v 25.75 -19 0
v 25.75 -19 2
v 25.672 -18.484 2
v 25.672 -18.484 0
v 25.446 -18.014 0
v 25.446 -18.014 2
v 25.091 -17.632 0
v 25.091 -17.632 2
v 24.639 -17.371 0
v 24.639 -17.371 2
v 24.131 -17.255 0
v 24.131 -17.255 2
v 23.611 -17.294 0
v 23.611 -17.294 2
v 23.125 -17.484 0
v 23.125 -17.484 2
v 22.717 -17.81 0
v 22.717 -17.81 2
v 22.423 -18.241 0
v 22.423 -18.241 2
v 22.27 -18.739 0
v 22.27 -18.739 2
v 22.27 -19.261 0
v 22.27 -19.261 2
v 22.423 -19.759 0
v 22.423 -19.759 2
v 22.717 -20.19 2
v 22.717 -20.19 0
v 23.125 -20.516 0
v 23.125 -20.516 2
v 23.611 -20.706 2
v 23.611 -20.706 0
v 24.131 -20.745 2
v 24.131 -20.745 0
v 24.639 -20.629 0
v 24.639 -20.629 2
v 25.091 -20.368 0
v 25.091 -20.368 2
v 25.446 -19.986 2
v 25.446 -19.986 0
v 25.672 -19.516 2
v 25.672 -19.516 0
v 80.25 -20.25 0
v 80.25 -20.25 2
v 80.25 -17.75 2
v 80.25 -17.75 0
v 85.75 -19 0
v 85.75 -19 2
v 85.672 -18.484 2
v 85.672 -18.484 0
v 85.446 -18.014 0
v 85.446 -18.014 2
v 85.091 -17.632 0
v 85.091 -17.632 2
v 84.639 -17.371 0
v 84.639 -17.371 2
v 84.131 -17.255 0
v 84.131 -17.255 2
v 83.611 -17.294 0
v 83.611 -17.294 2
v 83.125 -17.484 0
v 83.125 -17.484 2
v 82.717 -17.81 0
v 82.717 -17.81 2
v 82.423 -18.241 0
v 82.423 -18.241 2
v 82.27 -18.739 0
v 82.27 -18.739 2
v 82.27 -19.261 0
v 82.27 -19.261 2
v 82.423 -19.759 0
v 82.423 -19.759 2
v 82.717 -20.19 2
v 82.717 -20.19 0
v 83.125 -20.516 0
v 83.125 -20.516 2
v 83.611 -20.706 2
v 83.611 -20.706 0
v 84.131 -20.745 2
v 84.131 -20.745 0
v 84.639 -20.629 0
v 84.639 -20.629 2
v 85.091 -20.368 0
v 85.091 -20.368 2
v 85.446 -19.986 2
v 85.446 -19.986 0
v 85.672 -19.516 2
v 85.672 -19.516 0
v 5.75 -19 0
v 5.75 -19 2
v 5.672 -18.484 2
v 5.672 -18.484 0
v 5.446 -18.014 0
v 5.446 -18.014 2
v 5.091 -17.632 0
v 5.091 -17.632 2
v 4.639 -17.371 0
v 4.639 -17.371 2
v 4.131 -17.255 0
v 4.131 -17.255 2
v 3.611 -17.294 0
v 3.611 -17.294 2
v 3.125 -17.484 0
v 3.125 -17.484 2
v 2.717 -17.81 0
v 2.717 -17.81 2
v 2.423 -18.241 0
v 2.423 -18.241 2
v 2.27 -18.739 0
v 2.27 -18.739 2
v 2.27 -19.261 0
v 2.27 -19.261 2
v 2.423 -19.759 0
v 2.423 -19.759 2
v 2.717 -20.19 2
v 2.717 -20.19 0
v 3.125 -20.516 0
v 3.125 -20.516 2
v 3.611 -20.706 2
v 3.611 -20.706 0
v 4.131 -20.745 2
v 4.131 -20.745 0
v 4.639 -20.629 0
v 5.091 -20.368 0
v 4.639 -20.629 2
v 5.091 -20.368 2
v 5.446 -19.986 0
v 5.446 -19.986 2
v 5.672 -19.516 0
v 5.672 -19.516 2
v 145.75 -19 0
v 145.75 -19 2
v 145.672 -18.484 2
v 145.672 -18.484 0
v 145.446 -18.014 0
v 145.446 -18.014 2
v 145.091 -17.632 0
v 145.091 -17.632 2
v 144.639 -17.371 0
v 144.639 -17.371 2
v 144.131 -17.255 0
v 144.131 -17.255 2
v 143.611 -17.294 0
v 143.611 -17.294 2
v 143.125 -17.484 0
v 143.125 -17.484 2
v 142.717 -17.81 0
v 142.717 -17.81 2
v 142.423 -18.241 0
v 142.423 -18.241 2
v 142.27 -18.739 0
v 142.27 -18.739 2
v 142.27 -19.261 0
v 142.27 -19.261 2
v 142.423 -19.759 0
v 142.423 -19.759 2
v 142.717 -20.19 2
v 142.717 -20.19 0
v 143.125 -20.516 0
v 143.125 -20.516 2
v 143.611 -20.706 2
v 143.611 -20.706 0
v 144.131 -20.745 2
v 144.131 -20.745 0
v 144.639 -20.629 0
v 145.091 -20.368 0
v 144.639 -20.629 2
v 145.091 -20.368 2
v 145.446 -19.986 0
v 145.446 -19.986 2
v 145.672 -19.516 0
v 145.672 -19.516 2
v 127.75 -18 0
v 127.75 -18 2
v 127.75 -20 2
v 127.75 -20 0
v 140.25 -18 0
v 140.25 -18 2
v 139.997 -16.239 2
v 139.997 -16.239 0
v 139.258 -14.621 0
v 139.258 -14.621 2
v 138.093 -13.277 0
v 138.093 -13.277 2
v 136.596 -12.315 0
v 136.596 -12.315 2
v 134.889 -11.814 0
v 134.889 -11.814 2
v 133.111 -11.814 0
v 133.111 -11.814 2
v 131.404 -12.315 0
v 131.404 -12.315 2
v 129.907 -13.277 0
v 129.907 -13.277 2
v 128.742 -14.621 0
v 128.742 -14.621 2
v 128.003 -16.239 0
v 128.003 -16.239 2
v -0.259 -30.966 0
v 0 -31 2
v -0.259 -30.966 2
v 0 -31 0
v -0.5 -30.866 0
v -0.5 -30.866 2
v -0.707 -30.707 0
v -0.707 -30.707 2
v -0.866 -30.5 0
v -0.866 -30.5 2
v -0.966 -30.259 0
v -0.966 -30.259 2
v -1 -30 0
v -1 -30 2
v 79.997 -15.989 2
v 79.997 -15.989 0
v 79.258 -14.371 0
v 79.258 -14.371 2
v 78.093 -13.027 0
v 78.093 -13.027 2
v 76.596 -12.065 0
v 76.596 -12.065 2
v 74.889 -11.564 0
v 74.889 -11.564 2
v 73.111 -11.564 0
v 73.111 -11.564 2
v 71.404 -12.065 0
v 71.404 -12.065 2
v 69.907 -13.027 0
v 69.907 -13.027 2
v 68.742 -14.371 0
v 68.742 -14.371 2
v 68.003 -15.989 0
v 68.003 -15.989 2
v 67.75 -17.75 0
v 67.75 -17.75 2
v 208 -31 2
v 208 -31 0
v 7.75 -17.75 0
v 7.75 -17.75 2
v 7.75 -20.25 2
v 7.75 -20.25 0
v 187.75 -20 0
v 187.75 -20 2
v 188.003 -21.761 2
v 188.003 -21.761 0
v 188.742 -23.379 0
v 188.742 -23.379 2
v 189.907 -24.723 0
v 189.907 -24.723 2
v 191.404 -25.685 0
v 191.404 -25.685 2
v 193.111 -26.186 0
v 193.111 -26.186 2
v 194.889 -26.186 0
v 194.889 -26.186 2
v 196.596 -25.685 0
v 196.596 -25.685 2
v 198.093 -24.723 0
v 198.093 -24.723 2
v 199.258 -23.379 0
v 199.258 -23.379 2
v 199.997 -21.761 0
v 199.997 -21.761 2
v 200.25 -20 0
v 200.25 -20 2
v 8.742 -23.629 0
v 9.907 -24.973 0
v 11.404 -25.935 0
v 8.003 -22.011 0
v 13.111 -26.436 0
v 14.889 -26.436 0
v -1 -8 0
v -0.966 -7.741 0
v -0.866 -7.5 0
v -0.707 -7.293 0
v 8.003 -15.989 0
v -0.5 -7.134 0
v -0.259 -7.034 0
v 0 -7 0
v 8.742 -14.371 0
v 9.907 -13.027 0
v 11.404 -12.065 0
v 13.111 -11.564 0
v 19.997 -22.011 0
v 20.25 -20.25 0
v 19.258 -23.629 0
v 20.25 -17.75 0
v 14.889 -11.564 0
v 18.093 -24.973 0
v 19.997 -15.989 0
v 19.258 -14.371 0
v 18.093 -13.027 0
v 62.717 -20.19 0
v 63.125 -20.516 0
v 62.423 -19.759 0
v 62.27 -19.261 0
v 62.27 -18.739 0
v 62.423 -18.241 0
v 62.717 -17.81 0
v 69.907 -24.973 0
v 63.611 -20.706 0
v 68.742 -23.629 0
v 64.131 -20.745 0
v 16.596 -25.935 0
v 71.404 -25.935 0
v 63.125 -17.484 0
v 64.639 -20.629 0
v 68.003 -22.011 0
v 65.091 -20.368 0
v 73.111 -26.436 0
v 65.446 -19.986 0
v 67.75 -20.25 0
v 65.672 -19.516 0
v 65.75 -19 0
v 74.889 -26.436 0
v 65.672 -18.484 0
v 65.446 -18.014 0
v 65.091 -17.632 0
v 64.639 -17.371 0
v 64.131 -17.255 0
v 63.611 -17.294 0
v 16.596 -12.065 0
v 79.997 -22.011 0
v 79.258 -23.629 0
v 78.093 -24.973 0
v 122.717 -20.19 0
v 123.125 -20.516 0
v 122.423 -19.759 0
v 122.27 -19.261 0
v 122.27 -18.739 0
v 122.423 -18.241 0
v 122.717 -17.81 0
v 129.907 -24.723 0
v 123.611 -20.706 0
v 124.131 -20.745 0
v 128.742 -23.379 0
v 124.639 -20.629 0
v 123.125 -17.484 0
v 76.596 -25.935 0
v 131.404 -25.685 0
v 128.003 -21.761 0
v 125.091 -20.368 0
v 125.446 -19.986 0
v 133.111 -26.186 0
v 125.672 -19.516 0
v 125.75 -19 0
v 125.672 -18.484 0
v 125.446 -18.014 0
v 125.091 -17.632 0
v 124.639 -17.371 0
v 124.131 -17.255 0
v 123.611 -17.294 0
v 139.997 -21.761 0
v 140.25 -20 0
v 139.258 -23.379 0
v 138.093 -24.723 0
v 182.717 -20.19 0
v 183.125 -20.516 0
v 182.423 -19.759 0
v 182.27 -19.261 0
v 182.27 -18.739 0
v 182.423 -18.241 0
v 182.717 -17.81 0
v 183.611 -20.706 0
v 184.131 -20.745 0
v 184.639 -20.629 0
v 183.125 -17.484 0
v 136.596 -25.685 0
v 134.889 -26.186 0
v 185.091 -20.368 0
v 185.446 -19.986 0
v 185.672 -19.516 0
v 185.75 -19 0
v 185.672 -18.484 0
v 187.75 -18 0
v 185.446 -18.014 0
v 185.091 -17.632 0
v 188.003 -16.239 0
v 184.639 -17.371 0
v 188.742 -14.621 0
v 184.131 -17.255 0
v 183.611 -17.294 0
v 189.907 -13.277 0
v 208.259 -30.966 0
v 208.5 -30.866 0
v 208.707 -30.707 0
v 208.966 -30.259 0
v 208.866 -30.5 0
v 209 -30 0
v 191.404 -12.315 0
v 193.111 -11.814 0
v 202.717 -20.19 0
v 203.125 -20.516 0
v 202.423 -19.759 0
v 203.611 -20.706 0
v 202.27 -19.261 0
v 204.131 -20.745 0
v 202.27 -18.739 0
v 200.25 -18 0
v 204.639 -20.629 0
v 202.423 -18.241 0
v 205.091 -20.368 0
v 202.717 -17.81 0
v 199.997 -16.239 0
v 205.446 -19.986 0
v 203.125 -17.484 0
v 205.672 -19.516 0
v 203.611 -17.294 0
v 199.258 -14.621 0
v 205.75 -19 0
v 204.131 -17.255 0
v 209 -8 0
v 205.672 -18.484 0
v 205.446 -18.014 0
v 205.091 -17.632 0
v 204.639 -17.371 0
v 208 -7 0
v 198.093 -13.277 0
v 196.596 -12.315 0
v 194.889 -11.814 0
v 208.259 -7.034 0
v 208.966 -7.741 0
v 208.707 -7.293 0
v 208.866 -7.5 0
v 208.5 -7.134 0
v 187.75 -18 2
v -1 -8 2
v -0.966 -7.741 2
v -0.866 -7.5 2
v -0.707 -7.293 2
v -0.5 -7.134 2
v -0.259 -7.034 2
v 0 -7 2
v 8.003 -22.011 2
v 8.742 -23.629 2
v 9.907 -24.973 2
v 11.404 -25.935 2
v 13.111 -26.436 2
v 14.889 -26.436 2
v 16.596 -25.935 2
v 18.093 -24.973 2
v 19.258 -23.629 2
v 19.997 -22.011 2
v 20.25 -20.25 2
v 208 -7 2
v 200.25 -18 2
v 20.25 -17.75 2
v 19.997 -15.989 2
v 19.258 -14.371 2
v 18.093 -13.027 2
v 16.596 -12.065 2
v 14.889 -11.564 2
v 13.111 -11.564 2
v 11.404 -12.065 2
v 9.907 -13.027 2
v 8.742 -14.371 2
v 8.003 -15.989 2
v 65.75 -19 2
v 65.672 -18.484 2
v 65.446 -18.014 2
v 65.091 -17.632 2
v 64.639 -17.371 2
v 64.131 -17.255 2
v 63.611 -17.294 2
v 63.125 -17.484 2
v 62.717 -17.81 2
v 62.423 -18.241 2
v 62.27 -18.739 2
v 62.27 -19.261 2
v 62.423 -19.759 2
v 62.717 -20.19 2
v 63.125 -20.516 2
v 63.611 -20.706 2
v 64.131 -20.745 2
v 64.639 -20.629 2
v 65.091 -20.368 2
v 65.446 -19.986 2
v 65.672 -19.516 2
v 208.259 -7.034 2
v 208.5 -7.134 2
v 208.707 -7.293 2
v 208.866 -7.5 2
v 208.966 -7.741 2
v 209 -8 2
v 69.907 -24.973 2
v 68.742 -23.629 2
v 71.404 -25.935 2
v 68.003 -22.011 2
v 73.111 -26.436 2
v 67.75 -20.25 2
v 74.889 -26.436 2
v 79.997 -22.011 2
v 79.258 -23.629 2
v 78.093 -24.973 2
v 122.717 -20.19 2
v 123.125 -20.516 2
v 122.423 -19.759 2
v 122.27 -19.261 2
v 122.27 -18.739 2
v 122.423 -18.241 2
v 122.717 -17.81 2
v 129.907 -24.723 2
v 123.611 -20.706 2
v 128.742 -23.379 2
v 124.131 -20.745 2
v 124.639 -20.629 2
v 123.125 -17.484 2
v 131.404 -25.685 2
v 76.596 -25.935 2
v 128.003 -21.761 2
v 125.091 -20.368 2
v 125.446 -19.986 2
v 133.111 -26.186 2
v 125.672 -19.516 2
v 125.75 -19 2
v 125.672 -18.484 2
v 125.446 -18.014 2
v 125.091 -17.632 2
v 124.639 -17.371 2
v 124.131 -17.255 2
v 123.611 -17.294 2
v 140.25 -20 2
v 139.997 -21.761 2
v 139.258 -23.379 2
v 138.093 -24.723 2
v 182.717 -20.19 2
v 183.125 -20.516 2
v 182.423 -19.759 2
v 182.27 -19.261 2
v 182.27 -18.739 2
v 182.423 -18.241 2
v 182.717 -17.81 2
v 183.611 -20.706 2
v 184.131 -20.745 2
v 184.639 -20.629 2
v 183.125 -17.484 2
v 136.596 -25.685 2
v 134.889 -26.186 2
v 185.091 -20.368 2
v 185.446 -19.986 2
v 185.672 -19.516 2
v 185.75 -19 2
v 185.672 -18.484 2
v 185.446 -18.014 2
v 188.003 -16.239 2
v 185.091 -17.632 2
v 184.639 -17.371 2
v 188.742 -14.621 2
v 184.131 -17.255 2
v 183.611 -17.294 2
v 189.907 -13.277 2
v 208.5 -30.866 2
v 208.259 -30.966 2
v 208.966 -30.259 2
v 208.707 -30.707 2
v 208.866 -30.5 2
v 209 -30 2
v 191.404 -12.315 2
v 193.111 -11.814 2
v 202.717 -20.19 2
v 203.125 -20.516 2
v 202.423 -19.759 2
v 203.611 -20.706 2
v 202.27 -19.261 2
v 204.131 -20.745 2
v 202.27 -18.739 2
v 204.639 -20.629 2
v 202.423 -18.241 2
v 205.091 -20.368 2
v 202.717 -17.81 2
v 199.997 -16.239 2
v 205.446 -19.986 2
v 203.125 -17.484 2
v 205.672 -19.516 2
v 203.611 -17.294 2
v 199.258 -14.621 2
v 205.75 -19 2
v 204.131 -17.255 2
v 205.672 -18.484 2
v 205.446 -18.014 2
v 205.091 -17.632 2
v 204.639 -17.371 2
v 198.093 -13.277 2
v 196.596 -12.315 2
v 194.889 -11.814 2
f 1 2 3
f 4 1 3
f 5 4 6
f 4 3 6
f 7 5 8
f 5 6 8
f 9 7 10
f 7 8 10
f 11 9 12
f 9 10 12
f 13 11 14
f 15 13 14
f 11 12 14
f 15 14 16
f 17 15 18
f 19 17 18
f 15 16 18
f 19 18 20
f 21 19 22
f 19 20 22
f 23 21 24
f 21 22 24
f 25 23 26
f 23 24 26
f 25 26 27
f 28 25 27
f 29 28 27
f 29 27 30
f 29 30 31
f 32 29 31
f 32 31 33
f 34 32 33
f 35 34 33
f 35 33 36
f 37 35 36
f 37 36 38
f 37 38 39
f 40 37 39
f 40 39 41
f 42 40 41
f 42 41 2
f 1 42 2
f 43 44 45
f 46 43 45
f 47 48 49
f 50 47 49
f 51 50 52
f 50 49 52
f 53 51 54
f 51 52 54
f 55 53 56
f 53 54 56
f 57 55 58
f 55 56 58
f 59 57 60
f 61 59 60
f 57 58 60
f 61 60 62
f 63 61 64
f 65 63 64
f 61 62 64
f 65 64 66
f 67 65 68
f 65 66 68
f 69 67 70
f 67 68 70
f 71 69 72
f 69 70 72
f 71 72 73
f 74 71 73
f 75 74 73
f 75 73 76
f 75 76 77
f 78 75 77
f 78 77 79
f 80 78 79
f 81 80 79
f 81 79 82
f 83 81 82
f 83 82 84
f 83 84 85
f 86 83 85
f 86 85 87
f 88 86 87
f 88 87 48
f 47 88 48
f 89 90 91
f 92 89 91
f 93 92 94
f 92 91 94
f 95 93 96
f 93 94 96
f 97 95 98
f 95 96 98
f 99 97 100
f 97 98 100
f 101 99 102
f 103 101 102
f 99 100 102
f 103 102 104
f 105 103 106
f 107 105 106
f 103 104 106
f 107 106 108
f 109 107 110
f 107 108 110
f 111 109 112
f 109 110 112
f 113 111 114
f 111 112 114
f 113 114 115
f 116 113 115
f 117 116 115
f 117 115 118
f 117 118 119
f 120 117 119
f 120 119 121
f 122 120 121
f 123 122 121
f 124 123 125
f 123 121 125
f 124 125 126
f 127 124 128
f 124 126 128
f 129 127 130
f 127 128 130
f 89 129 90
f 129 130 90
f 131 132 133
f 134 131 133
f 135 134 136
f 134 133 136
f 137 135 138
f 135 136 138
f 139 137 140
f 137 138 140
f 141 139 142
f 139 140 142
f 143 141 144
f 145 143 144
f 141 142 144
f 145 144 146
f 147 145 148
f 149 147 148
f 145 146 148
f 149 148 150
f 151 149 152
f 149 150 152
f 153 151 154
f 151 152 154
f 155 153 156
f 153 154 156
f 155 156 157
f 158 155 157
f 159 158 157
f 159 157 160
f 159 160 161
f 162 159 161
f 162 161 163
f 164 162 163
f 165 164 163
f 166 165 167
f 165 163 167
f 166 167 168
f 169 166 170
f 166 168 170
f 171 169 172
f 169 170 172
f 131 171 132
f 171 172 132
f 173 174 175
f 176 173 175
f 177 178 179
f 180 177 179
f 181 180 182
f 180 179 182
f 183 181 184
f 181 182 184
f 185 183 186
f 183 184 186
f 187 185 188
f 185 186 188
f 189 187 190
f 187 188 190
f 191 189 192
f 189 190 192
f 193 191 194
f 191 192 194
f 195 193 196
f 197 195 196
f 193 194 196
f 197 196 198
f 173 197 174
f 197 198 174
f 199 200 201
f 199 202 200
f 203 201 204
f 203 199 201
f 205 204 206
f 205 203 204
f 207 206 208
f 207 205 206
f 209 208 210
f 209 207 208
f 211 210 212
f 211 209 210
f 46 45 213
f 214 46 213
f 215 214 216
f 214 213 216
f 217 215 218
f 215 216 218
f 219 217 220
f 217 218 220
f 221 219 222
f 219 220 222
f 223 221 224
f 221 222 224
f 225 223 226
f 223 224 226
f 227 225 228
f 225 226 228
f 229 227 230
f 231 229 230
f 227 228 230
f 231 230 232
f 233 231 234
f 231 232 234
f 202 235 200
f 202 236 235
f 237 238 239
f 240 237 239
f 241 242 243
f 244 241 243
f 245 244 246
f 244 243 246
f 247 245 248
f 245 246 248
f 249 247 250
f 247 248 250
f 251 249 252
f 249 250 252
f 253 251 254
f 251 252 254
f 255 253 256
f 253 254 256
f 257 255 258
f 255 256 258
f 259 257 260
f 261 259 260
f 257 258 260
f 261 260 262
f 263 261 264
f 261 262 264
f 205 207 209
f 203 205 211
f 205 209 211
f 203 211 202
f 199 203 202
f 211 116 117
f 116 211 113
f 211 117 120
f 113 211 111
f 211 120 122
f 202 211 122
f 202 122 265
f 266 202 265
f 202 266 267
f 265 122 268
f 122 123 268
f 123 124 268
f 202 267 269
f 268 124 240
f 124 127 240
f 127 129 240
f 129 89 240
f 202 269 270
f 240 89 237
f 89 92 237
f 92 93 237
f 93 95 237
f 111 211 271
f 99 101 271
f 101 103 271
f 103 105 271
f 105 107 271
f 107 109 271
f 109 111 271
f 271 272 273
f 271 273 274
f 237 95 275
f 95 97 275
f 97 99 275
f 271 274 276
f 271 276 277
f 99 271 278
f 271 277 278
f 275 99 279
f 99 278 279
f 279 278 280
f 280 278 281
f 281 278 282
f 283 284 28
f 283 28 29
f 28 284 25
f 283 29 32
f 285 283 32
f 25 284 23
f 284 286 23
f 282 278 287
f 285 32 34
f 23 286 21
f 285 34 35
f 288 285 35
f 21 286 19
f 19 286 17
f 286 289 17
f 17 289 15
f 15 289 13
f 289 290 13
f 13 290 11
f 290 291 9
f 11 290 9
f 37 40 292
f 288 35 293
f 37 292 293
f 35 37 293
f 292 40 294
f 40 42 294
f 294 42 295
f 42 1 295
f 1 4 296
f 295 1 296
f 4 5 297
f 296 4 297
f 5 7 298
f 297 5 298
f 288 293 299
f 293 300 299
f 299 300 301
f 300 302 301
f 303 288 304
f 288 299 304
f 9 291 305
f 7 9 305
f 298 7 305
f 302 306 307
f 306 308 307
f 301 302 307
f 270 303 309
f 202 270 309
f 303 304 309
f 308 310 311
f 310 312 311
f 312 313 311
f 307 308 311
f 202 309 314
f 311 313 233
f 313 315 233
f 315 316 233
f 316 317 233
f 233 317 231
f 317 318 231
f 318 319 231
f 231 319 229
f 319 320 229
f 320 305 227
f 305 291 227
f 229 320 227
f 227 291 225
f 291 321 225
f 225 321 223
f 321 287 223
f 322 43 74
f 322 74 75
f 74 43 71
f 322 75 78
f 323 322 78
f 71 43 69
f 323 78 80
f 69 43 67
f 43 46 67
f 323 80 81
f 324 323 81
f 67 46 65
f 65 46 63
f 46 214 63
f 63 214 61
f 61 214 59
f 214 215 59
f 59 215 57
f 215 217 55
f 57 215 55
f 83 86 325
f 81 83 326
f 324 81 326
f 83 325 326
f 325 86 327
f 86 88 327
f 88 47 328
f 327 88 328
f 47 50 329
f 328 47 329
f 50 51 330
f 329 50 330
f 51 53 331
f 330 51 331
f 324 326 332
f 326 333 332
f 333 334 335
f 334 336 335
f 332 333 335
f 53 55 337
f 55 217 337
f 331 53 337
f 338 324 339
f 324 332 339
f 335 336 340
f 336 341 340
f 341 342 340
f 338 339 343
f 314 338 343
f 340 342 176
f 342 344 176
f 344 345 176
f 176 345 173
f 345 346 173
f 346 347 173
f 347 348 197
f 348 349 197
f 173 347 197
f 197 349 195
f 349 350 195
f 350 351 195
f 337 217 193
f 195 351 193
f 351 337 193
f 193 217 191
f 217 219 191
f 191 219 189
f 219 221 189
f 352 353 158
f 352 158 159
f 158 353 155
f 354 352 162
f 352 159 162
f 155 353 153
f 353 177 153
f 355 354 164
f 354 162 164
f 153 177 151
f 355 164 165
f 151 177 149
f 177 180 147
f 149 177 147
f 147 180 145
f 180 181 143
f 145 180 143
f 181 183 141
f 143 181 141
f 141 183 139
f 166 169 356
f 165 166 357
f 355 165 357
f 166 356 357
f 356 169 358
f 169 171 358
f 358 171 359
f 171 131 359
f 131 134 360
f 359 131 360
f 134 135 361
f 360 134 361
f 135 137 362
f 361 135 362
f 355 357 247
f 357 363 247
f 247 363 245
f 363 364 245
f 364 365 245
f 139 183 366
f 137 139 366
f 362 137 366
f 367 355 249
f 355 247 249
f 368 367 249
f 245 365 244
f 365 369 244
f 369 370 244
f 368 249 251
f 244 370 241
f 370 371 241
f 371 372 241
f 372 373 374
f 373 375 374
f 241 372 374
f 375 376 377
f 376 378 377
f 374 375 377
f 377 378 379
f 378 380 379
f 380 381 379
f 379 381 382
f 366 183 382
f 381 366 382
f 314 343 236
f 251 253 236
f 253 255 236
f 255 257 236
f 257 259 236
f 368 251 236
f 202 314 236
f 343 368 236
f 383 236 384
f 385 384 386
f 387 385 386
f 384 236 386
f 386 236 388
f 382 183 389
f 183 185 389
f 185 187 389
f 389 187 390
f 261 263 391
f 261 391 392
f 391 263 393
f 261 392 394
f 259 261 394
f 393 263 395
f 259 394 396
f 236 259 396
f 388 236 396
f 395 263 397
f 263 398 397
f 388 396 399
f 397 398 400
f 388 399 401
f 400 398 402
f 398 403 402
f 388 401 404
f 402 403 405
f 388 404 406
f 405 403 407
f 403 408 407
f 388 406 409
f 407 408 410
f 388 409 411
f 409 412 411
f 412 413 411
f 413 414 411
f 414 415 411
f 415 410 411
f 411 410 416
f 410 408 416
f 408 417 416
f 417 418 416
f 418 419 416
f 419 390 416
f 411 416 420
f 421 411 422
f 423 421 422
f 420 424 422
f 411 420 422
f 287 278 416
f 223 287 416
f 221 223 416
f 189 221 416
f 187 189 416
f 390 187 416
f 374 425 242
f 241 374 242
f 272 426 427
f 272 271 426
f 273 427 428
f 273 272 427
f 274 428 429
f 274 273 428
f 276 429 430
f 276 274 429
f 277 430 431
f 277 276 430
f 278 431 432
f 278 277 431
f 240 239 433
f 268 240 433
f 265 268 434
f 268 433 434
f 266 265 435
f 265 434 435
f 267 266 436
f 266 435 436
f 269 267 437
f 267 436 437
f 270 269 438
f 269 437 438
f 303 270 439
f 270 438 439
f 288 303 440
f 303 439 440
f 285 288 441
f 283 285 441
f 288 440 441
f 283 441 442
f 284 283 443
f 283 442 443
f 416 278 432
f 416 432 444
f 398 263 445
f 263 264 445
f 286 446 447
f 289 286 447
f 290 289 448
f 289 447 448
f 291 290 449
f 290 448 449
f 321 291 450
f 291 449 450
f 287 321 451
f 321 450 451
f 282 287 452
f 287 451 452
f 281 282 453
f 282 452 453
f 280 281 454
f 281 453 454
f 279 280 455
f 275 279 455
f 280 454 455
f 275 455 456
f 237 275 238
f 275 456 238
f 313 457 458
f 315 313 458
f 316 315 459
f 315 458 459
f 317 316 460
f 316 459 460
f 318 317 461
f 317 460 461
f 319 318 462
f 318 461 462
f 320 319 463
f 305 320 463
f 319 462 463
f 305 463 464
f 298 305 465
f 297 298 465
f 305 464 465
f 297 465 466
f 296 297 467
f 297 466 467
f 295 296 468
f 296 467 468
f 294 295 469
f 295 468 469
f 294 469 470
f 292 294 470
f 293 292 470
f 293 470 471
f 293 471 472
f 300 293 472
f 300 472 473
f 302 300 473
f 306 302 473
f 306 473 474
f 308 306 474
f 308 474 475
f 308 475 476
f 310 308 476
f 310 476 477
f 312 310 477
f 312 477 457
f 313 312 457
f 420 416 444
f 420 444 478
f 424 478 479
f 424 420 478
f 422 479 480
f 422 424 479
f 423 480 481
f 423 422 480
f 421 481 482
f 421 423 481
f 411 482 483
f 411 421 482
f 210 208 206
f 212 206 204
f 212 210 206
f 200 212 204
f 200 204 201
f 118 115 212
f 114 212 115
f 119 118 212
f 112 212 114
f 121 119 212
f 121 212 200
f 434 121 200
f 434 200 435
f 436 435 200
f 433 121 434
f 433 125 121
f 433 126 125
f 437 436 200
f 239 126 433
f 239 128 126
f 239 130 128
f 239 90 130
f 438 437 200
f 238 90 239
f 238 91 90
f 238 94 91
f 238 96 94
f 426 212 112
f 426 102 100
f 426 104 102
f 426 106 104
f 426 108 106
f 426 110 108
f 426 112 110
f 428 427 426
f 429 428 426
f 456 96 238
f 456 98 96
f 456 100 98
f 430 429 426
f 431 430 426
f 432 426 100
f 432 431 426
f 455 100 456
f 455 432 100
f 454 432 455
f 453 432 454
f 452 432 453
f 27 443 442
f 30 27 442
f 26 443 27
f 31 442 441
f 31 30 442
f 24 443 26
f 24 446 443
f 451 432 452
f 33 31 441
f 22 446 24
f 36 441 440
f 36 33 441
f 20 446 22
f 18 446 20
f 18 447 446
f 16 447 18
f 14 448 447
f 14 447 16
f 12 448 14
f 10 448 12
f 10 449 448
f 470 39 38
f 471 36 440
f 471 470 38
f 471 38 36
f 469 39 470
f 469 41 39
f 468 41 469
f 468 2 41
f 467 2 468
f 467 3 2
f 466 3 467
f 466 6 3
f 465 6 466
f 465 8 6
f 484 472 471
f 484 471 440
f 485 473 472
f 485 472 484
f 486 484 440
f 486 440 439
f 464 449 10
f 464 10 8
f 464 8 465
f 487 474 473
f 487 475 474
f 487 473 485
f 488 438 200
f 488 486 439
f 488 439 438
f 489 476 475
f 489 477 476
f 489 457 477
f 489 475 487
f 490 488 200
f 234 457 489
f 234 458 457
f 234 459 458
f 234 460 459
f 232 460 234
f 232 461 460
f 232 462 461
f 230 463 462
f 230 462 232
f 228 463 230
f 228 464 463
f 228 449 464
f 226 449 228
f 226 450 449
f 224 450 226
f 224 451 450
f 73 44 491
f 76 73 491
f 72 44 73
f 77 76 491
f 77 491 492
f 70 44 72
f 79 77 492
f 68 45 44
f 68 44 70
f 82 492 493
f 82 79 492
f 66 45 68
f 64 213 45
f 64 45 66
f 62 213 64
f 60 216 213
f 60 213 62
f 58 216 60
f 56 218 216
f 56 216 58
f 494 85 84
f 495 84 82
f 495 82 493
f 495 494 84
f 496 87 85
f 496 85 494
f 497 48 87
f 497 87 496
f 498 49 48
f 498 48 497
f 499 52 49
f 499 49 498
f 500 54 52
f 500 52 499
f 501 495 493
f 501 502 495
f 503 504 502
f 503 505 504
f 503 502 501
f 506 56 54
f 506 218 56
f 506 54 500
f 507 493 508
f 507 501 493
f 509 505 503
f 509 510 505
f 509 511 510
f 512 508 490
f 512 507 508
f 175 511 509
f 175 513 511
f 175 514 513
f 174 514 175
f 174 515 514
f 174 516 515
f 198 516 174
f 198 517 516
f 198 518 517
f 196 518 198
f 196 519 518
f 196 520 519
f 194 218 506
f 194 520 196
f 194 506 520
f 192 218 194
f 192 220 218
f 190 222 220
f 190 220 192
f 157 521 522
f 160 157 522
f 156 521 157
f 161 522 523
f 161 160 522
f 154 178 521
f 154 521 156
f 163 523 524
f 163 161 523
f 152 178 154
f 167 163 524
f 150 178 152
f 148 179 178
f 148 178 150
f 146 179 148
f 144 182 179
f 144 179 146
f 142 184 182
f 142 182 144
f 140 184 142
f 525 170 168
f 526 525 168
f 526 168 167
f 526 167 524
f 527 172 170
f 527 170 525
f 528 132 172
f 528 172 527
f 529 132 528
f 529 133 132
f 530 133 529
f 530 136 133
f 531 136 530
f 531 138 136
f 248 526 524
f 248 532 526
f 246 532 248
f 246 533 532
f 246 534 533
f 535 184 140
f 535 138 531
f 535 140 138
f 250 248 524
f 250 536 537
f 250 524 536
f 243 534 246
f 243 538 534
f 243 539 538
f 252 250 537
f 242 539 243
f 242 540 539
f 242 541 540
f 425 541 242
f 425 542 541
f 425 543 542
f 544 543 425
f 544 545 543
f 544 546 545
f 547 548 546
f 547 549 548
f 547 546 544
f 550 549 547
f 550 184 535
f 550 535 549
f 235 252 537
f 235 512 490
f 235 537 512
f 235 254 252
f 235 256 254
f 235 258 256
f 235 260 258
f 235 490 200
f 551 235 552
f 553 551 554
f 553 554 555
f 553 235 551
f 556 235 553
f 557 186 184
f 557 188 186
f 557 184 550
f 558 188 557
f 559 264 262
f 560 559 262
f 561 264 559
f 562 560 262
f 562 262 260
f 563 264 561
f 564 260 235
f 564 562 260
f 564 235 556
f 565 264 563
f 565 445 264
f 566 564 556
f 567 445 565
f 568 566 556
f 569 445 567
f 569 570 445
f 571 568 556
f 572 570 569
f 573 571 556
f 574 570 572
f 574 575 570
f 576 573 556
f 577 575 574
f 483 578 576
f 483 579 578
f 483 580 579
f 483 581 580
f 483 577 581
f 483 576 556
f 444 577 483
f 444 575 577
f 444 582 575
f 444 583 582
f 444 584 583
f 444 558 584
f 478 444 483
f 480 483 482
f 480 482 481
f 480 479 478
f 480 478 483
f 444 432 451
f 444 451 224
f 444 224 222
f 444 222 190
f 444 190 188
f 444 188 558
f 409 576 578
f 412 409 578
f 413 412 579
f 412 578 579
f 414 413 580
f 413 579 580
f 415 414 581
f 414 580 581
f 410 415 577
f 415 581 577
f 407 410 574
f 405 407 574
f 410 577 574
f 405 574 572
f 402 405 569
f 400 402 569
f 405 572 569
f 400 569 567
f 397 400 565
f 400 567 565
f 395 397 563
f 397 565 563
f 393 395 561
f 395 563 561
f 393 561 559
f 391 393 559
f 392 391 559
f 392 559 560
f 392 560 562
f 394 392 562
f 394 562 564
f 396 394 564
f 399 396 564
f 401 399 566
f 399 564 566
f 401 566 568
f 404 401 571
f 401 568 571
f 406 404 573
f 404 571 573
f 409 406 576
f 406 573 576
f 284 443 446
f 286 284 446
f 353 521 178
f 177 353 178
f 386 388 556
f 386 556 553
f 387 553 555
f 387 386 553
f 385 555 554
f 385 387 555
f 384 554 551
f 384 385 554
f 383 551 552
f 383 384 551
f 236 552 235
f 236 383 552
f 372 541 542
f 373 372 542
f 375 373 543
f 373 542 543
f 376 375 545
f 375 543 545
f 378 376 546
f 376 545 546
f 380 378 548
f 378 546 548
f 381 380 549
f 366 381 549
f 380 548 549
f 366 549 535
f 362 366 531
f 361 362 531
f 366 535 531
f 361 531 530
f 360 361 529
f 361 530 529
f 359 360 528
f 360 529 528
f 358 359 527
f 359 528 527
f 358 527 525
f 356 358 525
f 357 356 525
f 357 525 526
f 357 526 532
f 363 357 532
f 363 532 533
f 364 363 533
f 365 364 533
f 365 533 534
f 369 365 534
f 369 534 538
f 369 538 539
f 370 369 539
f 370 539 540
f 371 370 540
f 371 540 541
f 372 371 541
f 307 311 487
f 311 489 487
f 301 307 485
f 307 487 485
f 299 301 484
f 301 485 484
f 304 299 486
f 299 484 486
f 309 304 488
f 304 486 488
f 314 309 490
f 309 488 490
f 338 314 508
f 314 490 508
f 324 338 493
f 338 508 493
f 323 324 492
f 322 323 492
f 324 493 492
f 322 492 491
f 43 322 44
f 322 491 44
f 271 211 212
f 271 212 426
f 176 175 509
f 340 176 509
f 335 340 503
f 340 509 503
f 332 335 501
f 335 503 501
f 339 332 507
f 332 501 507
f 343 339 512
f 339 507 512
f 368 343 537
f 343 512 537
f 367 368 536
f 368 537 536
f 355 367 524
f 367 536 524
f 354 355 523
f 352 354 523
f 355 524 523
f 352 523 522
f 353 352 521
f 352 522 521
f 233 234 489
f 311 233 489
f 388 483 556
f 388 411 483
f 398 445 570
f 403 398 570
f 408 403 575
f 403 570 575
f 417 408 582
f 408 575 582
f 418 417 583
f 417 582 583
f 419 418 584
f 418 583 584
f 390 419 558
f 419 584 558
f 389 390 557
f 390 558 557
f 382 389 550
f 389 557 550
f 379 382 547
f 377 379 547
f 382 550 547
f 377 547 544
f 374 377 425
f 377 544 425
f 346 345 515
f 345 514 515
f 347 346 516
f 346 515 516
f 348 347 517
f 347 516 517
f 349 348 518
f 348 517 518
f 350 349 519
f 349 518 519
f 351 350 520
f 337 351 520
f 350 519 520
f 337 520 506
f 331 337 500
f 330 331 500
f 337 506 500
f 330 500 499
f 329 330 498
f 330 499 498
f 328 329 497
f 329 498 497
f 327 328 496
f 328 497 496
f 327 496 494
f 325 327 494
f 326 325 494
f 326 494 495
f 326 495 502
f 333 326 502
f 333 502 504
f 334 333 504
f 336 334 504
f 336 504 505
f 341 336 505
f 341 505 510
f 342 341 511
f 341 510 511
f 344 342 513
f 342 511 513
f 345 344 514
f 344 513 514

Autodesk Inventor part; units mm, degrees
ref_plane "YZ Plane" through (0, 0, 0) normal (1, 0, 0) x (0, 1, 0)
ref_plane "XZ Plane" through (0, 0, 0) normal (0, 1, 0) x (-1, 0, 0)
ref_plane "XY Plane" through (0, 0, 0) normal (0, 0, 1) x (1, 0, 0)
sketch "Sketch1" plane through (0, 0, 0) normal (0, 0, 1) x (1, 0, 0)
  line L0 (0, -7) -> (208, -7)
  line L1 (209, -8) -> (209, -30)
  line L2 (208, -31) -> (0, -31)
  line L3 (-1, -30) -> (-1, -8)
  circle A0 centre (38.25, -10.75) radius 1.75
  circle A1 centre (58.75, -10.75) radius 1.75
  circle A2 centre (149.25, -10.75) radius 1.75
  circle A3 centre (169.75, -10.75) radius 1.75
  circle A4 centre (38.25, -40.75) radius 1.75
  circle A5 centre (58.75, -40.75) radius 1.75
  circle A6 centre (149.25, -40.75) radius 1.75
  circle A7 centre (169.75, -40.75) radius 1.75
  arc A8 (0, -7) -> (-1, -8) centre (0, -8) ccw
  arc A9 (-1, -30) -> (0, -31) centre (0, -30) ccw
  arc A10 (208, -31) -> (209, -30) centre (208, -30) ccw
  arc A11 (209, -8) -> (208, -7) centre (208, -8) ccw
  point P0 (0, 0)
  point P1 (209, -31)
  point P2 (209, -7)
  point P3 (-1, -31)
  dimension "d0" = 210
  dimension "d1" = 24
  dimension "d10" = 111
  dimension "d13" = 30
  dimension "d16" = 1
extrude "Extrusion1" add sketch "Sketch1" along normal blind 2 contours L0 A11 L1 A10 L2 A9 L3 A8 | A0 | A1 | A2 | A3
sketch "Sketch2" plane through (0, 0, 2) normal (0, 0, 1) x (1, 0, 0)
  line L0 (209, -30) -> (209, -8) projected
  line L1 (209, -19) -> (-1, -19) construction
  line L2 (-1, -8) -> (-1, -30) projected
  line L3 (235.9536, -47.1551) -> (247.5417, -11.4905)
  line L4 (235.9536, -47.1551) -> (273.4536, -47.1551) construction
  line L5 (235.9536, -47.1551) -> (237.8557, -47.7731)
  line L6 (235.9536, -47.1551) -> (237.9536, -47.1551) construction
  line L7 (237.8557, -47.7731) -> (249.4438, -12.1085)
  line L8 (249.4438, -12.1085) -> (247.5417, -11.4905)
  line L9 (249.4438, -12.1085) -> (271.3181, -19.2159)
  line L10 (271.3181, -19.2159) -> (259.73, -54.8805)
  line L11 (259.73, -54.8805) -> (261.6321, -55.4986)
  line L12 (261.6321, -55.4986) -> (273.2202, -19.8339)
  line L13 (273.2202, -19.8339) -> (271.3181, -19.2159)
  line L14 (265.5241, -37.0482) -> (243.6498, -29.9408)
  line L15 (177.3204, -33.4945) -> (331.8534, -33.4945)
  line L16 (244.4446, -27.4945) -> (242.5425, -26.8765)
  line L17 (238.4427, -39.4945) -> (240.3448, -40.1125)
  line L18 (244.4446, -27.4945) -> (240.3448, -40.1125)
  line L19 (104, -19) -> (104, -19)
  line L20 (104, -19) -> (104, -19) construction
  line L21 (104, -20.25) -> (104, -17.75) construction
  line L22 (110.25, -20.25) -> (110.25, -17.75)
  line L23 (97.75, -17.75) -> (97.75, -20.25)
  arc A0 (97.75, -20.25) -> (110.25, -20.25) centre (104, -20.25) ccw
  arc A1 (110.25, -17.75) -> (97.75, -17.75) centre (104, -17.75) ccw
  line L24 (104, -19) -> (74, -19) construction
  line L25 (104, -19) -> (134, -19) construction
  line L26 (74, -20.25) -> (74, -17.75) construction
  line L27 (80.25, -20.25) -> (80.25, -17.75)
  line L28 (67.75, -17.75) -> (67.75, -20.25)
  arc A2 (67.75, -20.25) -> (80.25, -20.25) centre (74, -20.25) ccw
  arc A3 (80.25, -17.75) -> (67.75, -17.75) centre (74, -17.75) ccw
  line L29 (134, -20) -> (134, -18) construction
  line L30 (140.25, -20) -> (140.25, -18)
  line L31 (127.75, -18) -> (127.75, -20)
  arc A4 (127.75, -20) -> (140.25, -20) centre (134, -20) ccw
  arc A5 (140.25, -18) -> (127.75, -18) centre (134, -18) ccw
  line L32 (74, -19) -> (14, -19) construction
  line L33 (134, -19) -> (194, -19) construction
  line L34 (194, -20) -> (194, -18) construction
  line L35 (200.25, -20) -> (200.25, -18)
  line L36 (187.75, -18) -> (187.75, -20)
  arc A6 (187.75, -20) -> (200.25, -20) centre (194, -20) ccw
  arc A7 (200.25, -18) -> (187.75, -18) centre (194, -18) ccw
  line L37 (14, -20.25) -> (14, -17.75) construction
  line L38 (20.25, -20.25) -> (20.25, -17.75)
  line L39 (7.75, -17.75) -> (7.75, -20.25)
  arc A8 (7.75, -20.25) -> (20.25, -20.25) centre (14, -20.25) ccw
  arc A9 (20.25, -17.75) -> (7.75, -17.75) centre (14, -17.75) ccw
  circle A10 centre (14, -19) radius 10 construction
  line L40 (14, -19) -> (24.6066, -8.3934) construction
  line L41 (14, -19) -> (29, -19) construction
  line L42 (14, -19) -> (3.3934, -29.6066) construction
  circle A11 centre (4, -19) radius 1.75
  circle A12 centre (24, -19) radius 1.75
  circle A13 centre (54, -19) radius 1.75
  circle A14 centre (34, -19) radius 1.75
  circle A15 centre (84, -19) radius 1.75
  circle A16 centre (64, -19) radius 1.75
  circle A17 centre (114, -19) radius 1.75
  circle A18 centre (94, -19) radius 1.75
  circle A19 centre (144, -19) radius 1.75
  circle A20 centre (124, -19) radius 1.75
  circle A21 centre (174, -19) radius 1.75
  circle A22 centre (154, -19) radius 1.75
  circle A23 centre (204, -19) radius 1.75
  circle A24 centre (184, -19) radius 1.75
  point P0 (0, 0)
  point P1 (254.5869, -33.4945)
  dimension "d19" = 37.5
  dimension "d20" = 72
  dimension "d21" = 2
  dimension "d22" = 18
  dimension "d23" = 37.5
  dimension "d24" = 23
  dimension "d25" = 37.5
  dimension "d26" = 90
  dimension "d27" = 2
  dimension "d28" = 37.5
  dimension "d29" = 90
  dimension "d32" = 0
  dimension "d33" = 90
  dimension "d34" = 1.25
  dimension "d35" = 12.5
  dimension "d38" = 30
  dimension "d39" = 30
  dimension "d40" = 1.25
  dimension "d41" = 12.5
  dimension "d42" = 1
  dimension "d43" = 12.5
  dimension "d44" = 60
  dimension "d45" = 60
  dimension "d46" = 1
  dimension "d47" = 12.5
  dimension "d48" = 1.25
  dimension "d49" = 12.5
  dimension "d50" = 20
  dimension "d51" = 15
  dimension "d52" = 45
  dimension "d53" = 15
  dimension "d63" = 3.5
  dimension "d64" = 3.5
  dimension "d67" = 30
extrude "Extrusion2" cut sketch "Sketch2" against normal blind 10 contours A2 L28 A3 L27 | A4 L31 A5 L30 | A6 L36 A7 L35 | A8 L39 A9 L38 | A11 | A12 | A15 | A16 | A19 | A20 | A23 | A24
properties part number "Leg_Loadpipe_Plate" material "CFRP"
